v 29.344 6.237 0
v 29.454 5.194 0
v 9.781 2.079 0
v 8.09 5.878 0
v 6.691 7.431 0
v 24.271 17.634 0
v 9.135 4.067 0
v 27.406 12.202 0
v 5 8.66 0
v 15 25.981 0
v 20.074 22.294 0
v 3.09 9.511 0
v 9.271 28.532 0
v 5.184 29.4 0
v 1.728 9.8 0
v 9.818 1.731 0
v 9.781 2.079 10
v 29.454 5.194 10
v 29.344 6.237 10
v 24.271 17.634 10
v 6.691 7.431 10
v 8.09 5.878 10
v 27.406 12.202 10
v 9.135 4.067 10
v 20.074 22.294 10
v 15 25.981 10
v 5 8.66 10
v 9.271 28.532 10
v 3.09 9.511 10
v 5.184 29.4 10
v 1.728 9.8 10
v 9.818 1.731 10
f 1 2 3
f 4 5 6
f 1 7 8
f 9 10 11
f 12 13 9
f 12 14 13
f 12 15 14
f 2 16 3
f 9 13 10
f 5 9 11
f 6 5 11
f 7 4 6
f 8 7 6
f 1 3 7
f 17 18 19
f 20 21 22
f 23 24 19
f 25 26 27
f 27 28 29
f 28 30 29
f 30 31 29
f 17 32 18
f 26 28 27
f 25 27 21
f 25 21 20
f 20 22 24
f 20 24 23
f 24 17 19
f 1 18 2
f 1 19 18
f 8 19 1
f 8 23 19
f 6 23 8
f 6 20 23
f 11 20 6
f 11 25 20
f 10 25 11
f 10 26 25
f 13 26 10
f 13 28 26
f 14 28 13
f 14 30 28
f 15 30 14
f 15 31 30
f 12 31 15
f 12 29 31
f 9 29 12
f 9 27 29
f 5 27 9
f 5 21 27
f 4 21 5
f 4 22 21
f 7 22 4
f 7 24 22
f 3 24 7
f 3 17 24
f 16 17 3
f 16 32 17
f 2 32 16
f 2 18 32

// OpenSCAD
// Unit of length: Unit.MM
linear_extrude(height = 10.0, center = false, twist = 0.0, scale = 1.0)
{
   intersection()
   {
      difference()
      {
         circle(d = 60.0);
         circle(d = 20.0);
      }
      polygon(points = [[0.0, 0.0], [36.0789, 6.3617], [6.3617, 36.0789]], convexity = 1);
   }
}
